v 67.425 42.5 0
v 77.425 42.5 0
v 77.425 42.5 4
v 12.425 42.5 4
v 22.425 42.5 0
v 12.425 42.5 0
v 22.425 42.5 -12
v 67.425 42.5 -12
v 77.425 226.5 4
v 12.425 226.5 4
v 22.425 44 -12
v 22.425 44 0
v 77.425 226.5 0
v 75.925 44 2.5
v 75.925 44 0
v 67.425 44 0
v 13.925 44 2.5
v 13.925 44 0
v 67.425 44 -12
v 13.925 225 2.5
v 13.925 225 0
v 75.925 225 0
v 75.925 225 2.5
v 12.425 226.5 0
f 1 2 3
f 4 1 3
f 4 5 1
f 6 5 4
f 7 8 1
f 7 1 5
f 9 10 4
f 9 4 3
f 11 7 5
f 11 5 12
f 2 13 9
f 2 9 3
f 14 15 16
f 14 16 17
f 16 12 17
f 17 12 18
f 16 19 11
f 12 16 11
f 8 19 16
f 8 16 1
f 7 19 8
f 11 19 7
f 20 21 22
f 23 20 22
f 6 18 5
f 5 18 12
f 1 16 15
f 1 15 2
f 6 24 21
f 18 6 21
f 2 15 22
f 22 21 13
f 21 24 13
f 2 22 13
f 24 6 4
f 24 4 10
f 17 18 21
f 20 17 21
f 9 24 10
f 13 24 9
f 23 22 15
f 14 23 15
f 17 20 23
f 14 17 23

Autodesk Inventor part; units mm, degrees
ref_plane "YZ Plane" through (0, 0, 0) normal (1, 0, 0) x (0, 1, 0)
ref_plane "XZ Plane" through (0, 0, 0) normal (0, 1, 0) x (-1, 0, 0)
sketch "Szkic1" plane through (0, 0, 0) normal (0, 0, 1) x (1, 0, 0)
  line L0 (12.425, 226.5) -> (77.425, 226.5)
  line L1 (77.425, 226.5) -> (77.425, 42.5)
  line L2 (77.425, 42.5) -> (12.425, 42.5)
  line L3 (12.425, 42.5) -> (12.425, 226.5)
extrude "Wyciągnięcie proste1" add sketch "Szkic1" along normal blind 4
shell "Skorupa1" thickness 1.5 removed faces 1 at (55.7583, 103.8333, 0)
ref_plane "Płaszczyzna konstrukcyjna1" through (20.925, 15, -12) normal (0, 0, -1) x (0, 1, 0)
sketch "Szkic2" plane through (0, 0, 0) normal (0, 0, -1) x (-1, 0, 0)
  line L0 (-13.925, 44) -> (-75.925, 44)
  line L1 (-77.425, 42.5) -> (-12.425, 42.5)
  line L2 (-22.425, 17.5) -> (-22.425, 215.5)
  arc A0 (-23.425, 16.5) -> (-22.425, 17.5) centre (-23.425, 17.5) ccw
  line L3 (-66.425, 16.5) -> (-23.425, 16.5)
  arc A1 (-67.425, 17.5) -> (-66.425, 16.5) centre (-66.425, 17.5) ccw
  line L4 (-67.425, 215.5) -> (-67.425, 17.5)
  arc A2 (-66.425, 216.5) -> (-67.425, 215.5) centre (-66.425, 215.5) ccw
  line L5 (-23.425, 216.5) -> (-66.425, 216.5)
  arc A3 (-22.425, 215.5) -> (-23.425, 216.5) centre (-23.425, 215.5) ccw
  line L6 (-20.925, 218) -> (-20.925, 15)
  line L7 (-68.925, 218) -> (-20.925, 218)
  line L8 (-68.925, 15) -> (-68.925, 218)
  line L9 (-20.925, 15) -> (-68.925, 15)
  line L10 (-1.5, 236.5) -> (-88.35, 236.5)
  line L11 (-88.35, 0) -> (-88.35, 236.5)
  line L12 (-88.35, 0) -> (-1.5, 0)
  line L13 (-1.5, 0) -> (-1.5, 236.5)
  line L14 (-68.925, 15) -> (-68.925, 218)
  line L15 (-68.925, 218) -> (-20.925, 218)
  line L16 (-20.925, 218) -> (-20.925, 15)
  line L17 (-20.925, 15) -> (-68.925, 15)
  line L18 (-22.425, 17.5) -> (-22.425, 215.5)
  arc A4 (-23.425, 16.5) -> (-22.425, 17.5) centre (-23.425, 17.5) ccw
  line L19 (-66.425, 16.5) -> (-23.425, 16.5)
  arc A5 (-67.425, 17.5) -> (-66.425, 16.5) centre (-66.425, 17.5) ccw
  line L20 (-67.425, 215.5) -> (-67.425, 17.5)
  arc A6 (-66.425, 216.5) -> (-67.425, 215.5) centre (-66.425, 215.5) ccw
  line L21 (-23.425, 216.5) -> (-66.425, 216.5)
  arc A7 (-22.425, 215.5) -> (-23.425, 216.5) centre (-23.425, 215.5) ccw
  line L22 (-20.925, 218) -> (-20.925, 15)
  line L23 (-68.925, 218) -> (-20.925, 218)
  line L24 (-68.925, 15) -> (-68.925, 218)
  line L25 (-20.925, 15) -> (-68.925, 15)
  line L26 (-68.925, 15) -> (-68.925, 218)
  line L27 (-1.5, 236.5) -> (-88.35, 236.5)
  line L28 (-88.35, 0) -> (-88.35, 236.5)
  line L29 (-88.35, 0) -> (-1.5, 0)
  line L30 (-1.5, 0) -> (-1.5, 236.5)
  line L31 (-68.925, 15) -> (-68.925, 218)
  line L32 (-68.925, 218) -> (-20.925, 218)
  line L33 (-20.925, 218) -> (-20.925, 15)
  line L34 (-20.925, 15) -> (-68.925, 15)
  line L35 (-67.425, 44) -> (-22.425, 44)
  line L36 (-22.425, 44) -> (-22.425, 42.5)
  line L37 (-22.425, 42.5) -> (-67.425, 42.5)
  line L38 (-67.425, 42.5) -> (-67.425, 44)
  point P0 (0, 0)
extrude "Wyciągnięcie proste2" add sketch "Szkic2" along normal up to surface (12 mm away) contours L2 L1 L4 L0
properties part number "TYLNA CZARNA OBUDOWA STOJAKA" material "Tworzywo sztuczne, nieprzezroczyste czarne"
